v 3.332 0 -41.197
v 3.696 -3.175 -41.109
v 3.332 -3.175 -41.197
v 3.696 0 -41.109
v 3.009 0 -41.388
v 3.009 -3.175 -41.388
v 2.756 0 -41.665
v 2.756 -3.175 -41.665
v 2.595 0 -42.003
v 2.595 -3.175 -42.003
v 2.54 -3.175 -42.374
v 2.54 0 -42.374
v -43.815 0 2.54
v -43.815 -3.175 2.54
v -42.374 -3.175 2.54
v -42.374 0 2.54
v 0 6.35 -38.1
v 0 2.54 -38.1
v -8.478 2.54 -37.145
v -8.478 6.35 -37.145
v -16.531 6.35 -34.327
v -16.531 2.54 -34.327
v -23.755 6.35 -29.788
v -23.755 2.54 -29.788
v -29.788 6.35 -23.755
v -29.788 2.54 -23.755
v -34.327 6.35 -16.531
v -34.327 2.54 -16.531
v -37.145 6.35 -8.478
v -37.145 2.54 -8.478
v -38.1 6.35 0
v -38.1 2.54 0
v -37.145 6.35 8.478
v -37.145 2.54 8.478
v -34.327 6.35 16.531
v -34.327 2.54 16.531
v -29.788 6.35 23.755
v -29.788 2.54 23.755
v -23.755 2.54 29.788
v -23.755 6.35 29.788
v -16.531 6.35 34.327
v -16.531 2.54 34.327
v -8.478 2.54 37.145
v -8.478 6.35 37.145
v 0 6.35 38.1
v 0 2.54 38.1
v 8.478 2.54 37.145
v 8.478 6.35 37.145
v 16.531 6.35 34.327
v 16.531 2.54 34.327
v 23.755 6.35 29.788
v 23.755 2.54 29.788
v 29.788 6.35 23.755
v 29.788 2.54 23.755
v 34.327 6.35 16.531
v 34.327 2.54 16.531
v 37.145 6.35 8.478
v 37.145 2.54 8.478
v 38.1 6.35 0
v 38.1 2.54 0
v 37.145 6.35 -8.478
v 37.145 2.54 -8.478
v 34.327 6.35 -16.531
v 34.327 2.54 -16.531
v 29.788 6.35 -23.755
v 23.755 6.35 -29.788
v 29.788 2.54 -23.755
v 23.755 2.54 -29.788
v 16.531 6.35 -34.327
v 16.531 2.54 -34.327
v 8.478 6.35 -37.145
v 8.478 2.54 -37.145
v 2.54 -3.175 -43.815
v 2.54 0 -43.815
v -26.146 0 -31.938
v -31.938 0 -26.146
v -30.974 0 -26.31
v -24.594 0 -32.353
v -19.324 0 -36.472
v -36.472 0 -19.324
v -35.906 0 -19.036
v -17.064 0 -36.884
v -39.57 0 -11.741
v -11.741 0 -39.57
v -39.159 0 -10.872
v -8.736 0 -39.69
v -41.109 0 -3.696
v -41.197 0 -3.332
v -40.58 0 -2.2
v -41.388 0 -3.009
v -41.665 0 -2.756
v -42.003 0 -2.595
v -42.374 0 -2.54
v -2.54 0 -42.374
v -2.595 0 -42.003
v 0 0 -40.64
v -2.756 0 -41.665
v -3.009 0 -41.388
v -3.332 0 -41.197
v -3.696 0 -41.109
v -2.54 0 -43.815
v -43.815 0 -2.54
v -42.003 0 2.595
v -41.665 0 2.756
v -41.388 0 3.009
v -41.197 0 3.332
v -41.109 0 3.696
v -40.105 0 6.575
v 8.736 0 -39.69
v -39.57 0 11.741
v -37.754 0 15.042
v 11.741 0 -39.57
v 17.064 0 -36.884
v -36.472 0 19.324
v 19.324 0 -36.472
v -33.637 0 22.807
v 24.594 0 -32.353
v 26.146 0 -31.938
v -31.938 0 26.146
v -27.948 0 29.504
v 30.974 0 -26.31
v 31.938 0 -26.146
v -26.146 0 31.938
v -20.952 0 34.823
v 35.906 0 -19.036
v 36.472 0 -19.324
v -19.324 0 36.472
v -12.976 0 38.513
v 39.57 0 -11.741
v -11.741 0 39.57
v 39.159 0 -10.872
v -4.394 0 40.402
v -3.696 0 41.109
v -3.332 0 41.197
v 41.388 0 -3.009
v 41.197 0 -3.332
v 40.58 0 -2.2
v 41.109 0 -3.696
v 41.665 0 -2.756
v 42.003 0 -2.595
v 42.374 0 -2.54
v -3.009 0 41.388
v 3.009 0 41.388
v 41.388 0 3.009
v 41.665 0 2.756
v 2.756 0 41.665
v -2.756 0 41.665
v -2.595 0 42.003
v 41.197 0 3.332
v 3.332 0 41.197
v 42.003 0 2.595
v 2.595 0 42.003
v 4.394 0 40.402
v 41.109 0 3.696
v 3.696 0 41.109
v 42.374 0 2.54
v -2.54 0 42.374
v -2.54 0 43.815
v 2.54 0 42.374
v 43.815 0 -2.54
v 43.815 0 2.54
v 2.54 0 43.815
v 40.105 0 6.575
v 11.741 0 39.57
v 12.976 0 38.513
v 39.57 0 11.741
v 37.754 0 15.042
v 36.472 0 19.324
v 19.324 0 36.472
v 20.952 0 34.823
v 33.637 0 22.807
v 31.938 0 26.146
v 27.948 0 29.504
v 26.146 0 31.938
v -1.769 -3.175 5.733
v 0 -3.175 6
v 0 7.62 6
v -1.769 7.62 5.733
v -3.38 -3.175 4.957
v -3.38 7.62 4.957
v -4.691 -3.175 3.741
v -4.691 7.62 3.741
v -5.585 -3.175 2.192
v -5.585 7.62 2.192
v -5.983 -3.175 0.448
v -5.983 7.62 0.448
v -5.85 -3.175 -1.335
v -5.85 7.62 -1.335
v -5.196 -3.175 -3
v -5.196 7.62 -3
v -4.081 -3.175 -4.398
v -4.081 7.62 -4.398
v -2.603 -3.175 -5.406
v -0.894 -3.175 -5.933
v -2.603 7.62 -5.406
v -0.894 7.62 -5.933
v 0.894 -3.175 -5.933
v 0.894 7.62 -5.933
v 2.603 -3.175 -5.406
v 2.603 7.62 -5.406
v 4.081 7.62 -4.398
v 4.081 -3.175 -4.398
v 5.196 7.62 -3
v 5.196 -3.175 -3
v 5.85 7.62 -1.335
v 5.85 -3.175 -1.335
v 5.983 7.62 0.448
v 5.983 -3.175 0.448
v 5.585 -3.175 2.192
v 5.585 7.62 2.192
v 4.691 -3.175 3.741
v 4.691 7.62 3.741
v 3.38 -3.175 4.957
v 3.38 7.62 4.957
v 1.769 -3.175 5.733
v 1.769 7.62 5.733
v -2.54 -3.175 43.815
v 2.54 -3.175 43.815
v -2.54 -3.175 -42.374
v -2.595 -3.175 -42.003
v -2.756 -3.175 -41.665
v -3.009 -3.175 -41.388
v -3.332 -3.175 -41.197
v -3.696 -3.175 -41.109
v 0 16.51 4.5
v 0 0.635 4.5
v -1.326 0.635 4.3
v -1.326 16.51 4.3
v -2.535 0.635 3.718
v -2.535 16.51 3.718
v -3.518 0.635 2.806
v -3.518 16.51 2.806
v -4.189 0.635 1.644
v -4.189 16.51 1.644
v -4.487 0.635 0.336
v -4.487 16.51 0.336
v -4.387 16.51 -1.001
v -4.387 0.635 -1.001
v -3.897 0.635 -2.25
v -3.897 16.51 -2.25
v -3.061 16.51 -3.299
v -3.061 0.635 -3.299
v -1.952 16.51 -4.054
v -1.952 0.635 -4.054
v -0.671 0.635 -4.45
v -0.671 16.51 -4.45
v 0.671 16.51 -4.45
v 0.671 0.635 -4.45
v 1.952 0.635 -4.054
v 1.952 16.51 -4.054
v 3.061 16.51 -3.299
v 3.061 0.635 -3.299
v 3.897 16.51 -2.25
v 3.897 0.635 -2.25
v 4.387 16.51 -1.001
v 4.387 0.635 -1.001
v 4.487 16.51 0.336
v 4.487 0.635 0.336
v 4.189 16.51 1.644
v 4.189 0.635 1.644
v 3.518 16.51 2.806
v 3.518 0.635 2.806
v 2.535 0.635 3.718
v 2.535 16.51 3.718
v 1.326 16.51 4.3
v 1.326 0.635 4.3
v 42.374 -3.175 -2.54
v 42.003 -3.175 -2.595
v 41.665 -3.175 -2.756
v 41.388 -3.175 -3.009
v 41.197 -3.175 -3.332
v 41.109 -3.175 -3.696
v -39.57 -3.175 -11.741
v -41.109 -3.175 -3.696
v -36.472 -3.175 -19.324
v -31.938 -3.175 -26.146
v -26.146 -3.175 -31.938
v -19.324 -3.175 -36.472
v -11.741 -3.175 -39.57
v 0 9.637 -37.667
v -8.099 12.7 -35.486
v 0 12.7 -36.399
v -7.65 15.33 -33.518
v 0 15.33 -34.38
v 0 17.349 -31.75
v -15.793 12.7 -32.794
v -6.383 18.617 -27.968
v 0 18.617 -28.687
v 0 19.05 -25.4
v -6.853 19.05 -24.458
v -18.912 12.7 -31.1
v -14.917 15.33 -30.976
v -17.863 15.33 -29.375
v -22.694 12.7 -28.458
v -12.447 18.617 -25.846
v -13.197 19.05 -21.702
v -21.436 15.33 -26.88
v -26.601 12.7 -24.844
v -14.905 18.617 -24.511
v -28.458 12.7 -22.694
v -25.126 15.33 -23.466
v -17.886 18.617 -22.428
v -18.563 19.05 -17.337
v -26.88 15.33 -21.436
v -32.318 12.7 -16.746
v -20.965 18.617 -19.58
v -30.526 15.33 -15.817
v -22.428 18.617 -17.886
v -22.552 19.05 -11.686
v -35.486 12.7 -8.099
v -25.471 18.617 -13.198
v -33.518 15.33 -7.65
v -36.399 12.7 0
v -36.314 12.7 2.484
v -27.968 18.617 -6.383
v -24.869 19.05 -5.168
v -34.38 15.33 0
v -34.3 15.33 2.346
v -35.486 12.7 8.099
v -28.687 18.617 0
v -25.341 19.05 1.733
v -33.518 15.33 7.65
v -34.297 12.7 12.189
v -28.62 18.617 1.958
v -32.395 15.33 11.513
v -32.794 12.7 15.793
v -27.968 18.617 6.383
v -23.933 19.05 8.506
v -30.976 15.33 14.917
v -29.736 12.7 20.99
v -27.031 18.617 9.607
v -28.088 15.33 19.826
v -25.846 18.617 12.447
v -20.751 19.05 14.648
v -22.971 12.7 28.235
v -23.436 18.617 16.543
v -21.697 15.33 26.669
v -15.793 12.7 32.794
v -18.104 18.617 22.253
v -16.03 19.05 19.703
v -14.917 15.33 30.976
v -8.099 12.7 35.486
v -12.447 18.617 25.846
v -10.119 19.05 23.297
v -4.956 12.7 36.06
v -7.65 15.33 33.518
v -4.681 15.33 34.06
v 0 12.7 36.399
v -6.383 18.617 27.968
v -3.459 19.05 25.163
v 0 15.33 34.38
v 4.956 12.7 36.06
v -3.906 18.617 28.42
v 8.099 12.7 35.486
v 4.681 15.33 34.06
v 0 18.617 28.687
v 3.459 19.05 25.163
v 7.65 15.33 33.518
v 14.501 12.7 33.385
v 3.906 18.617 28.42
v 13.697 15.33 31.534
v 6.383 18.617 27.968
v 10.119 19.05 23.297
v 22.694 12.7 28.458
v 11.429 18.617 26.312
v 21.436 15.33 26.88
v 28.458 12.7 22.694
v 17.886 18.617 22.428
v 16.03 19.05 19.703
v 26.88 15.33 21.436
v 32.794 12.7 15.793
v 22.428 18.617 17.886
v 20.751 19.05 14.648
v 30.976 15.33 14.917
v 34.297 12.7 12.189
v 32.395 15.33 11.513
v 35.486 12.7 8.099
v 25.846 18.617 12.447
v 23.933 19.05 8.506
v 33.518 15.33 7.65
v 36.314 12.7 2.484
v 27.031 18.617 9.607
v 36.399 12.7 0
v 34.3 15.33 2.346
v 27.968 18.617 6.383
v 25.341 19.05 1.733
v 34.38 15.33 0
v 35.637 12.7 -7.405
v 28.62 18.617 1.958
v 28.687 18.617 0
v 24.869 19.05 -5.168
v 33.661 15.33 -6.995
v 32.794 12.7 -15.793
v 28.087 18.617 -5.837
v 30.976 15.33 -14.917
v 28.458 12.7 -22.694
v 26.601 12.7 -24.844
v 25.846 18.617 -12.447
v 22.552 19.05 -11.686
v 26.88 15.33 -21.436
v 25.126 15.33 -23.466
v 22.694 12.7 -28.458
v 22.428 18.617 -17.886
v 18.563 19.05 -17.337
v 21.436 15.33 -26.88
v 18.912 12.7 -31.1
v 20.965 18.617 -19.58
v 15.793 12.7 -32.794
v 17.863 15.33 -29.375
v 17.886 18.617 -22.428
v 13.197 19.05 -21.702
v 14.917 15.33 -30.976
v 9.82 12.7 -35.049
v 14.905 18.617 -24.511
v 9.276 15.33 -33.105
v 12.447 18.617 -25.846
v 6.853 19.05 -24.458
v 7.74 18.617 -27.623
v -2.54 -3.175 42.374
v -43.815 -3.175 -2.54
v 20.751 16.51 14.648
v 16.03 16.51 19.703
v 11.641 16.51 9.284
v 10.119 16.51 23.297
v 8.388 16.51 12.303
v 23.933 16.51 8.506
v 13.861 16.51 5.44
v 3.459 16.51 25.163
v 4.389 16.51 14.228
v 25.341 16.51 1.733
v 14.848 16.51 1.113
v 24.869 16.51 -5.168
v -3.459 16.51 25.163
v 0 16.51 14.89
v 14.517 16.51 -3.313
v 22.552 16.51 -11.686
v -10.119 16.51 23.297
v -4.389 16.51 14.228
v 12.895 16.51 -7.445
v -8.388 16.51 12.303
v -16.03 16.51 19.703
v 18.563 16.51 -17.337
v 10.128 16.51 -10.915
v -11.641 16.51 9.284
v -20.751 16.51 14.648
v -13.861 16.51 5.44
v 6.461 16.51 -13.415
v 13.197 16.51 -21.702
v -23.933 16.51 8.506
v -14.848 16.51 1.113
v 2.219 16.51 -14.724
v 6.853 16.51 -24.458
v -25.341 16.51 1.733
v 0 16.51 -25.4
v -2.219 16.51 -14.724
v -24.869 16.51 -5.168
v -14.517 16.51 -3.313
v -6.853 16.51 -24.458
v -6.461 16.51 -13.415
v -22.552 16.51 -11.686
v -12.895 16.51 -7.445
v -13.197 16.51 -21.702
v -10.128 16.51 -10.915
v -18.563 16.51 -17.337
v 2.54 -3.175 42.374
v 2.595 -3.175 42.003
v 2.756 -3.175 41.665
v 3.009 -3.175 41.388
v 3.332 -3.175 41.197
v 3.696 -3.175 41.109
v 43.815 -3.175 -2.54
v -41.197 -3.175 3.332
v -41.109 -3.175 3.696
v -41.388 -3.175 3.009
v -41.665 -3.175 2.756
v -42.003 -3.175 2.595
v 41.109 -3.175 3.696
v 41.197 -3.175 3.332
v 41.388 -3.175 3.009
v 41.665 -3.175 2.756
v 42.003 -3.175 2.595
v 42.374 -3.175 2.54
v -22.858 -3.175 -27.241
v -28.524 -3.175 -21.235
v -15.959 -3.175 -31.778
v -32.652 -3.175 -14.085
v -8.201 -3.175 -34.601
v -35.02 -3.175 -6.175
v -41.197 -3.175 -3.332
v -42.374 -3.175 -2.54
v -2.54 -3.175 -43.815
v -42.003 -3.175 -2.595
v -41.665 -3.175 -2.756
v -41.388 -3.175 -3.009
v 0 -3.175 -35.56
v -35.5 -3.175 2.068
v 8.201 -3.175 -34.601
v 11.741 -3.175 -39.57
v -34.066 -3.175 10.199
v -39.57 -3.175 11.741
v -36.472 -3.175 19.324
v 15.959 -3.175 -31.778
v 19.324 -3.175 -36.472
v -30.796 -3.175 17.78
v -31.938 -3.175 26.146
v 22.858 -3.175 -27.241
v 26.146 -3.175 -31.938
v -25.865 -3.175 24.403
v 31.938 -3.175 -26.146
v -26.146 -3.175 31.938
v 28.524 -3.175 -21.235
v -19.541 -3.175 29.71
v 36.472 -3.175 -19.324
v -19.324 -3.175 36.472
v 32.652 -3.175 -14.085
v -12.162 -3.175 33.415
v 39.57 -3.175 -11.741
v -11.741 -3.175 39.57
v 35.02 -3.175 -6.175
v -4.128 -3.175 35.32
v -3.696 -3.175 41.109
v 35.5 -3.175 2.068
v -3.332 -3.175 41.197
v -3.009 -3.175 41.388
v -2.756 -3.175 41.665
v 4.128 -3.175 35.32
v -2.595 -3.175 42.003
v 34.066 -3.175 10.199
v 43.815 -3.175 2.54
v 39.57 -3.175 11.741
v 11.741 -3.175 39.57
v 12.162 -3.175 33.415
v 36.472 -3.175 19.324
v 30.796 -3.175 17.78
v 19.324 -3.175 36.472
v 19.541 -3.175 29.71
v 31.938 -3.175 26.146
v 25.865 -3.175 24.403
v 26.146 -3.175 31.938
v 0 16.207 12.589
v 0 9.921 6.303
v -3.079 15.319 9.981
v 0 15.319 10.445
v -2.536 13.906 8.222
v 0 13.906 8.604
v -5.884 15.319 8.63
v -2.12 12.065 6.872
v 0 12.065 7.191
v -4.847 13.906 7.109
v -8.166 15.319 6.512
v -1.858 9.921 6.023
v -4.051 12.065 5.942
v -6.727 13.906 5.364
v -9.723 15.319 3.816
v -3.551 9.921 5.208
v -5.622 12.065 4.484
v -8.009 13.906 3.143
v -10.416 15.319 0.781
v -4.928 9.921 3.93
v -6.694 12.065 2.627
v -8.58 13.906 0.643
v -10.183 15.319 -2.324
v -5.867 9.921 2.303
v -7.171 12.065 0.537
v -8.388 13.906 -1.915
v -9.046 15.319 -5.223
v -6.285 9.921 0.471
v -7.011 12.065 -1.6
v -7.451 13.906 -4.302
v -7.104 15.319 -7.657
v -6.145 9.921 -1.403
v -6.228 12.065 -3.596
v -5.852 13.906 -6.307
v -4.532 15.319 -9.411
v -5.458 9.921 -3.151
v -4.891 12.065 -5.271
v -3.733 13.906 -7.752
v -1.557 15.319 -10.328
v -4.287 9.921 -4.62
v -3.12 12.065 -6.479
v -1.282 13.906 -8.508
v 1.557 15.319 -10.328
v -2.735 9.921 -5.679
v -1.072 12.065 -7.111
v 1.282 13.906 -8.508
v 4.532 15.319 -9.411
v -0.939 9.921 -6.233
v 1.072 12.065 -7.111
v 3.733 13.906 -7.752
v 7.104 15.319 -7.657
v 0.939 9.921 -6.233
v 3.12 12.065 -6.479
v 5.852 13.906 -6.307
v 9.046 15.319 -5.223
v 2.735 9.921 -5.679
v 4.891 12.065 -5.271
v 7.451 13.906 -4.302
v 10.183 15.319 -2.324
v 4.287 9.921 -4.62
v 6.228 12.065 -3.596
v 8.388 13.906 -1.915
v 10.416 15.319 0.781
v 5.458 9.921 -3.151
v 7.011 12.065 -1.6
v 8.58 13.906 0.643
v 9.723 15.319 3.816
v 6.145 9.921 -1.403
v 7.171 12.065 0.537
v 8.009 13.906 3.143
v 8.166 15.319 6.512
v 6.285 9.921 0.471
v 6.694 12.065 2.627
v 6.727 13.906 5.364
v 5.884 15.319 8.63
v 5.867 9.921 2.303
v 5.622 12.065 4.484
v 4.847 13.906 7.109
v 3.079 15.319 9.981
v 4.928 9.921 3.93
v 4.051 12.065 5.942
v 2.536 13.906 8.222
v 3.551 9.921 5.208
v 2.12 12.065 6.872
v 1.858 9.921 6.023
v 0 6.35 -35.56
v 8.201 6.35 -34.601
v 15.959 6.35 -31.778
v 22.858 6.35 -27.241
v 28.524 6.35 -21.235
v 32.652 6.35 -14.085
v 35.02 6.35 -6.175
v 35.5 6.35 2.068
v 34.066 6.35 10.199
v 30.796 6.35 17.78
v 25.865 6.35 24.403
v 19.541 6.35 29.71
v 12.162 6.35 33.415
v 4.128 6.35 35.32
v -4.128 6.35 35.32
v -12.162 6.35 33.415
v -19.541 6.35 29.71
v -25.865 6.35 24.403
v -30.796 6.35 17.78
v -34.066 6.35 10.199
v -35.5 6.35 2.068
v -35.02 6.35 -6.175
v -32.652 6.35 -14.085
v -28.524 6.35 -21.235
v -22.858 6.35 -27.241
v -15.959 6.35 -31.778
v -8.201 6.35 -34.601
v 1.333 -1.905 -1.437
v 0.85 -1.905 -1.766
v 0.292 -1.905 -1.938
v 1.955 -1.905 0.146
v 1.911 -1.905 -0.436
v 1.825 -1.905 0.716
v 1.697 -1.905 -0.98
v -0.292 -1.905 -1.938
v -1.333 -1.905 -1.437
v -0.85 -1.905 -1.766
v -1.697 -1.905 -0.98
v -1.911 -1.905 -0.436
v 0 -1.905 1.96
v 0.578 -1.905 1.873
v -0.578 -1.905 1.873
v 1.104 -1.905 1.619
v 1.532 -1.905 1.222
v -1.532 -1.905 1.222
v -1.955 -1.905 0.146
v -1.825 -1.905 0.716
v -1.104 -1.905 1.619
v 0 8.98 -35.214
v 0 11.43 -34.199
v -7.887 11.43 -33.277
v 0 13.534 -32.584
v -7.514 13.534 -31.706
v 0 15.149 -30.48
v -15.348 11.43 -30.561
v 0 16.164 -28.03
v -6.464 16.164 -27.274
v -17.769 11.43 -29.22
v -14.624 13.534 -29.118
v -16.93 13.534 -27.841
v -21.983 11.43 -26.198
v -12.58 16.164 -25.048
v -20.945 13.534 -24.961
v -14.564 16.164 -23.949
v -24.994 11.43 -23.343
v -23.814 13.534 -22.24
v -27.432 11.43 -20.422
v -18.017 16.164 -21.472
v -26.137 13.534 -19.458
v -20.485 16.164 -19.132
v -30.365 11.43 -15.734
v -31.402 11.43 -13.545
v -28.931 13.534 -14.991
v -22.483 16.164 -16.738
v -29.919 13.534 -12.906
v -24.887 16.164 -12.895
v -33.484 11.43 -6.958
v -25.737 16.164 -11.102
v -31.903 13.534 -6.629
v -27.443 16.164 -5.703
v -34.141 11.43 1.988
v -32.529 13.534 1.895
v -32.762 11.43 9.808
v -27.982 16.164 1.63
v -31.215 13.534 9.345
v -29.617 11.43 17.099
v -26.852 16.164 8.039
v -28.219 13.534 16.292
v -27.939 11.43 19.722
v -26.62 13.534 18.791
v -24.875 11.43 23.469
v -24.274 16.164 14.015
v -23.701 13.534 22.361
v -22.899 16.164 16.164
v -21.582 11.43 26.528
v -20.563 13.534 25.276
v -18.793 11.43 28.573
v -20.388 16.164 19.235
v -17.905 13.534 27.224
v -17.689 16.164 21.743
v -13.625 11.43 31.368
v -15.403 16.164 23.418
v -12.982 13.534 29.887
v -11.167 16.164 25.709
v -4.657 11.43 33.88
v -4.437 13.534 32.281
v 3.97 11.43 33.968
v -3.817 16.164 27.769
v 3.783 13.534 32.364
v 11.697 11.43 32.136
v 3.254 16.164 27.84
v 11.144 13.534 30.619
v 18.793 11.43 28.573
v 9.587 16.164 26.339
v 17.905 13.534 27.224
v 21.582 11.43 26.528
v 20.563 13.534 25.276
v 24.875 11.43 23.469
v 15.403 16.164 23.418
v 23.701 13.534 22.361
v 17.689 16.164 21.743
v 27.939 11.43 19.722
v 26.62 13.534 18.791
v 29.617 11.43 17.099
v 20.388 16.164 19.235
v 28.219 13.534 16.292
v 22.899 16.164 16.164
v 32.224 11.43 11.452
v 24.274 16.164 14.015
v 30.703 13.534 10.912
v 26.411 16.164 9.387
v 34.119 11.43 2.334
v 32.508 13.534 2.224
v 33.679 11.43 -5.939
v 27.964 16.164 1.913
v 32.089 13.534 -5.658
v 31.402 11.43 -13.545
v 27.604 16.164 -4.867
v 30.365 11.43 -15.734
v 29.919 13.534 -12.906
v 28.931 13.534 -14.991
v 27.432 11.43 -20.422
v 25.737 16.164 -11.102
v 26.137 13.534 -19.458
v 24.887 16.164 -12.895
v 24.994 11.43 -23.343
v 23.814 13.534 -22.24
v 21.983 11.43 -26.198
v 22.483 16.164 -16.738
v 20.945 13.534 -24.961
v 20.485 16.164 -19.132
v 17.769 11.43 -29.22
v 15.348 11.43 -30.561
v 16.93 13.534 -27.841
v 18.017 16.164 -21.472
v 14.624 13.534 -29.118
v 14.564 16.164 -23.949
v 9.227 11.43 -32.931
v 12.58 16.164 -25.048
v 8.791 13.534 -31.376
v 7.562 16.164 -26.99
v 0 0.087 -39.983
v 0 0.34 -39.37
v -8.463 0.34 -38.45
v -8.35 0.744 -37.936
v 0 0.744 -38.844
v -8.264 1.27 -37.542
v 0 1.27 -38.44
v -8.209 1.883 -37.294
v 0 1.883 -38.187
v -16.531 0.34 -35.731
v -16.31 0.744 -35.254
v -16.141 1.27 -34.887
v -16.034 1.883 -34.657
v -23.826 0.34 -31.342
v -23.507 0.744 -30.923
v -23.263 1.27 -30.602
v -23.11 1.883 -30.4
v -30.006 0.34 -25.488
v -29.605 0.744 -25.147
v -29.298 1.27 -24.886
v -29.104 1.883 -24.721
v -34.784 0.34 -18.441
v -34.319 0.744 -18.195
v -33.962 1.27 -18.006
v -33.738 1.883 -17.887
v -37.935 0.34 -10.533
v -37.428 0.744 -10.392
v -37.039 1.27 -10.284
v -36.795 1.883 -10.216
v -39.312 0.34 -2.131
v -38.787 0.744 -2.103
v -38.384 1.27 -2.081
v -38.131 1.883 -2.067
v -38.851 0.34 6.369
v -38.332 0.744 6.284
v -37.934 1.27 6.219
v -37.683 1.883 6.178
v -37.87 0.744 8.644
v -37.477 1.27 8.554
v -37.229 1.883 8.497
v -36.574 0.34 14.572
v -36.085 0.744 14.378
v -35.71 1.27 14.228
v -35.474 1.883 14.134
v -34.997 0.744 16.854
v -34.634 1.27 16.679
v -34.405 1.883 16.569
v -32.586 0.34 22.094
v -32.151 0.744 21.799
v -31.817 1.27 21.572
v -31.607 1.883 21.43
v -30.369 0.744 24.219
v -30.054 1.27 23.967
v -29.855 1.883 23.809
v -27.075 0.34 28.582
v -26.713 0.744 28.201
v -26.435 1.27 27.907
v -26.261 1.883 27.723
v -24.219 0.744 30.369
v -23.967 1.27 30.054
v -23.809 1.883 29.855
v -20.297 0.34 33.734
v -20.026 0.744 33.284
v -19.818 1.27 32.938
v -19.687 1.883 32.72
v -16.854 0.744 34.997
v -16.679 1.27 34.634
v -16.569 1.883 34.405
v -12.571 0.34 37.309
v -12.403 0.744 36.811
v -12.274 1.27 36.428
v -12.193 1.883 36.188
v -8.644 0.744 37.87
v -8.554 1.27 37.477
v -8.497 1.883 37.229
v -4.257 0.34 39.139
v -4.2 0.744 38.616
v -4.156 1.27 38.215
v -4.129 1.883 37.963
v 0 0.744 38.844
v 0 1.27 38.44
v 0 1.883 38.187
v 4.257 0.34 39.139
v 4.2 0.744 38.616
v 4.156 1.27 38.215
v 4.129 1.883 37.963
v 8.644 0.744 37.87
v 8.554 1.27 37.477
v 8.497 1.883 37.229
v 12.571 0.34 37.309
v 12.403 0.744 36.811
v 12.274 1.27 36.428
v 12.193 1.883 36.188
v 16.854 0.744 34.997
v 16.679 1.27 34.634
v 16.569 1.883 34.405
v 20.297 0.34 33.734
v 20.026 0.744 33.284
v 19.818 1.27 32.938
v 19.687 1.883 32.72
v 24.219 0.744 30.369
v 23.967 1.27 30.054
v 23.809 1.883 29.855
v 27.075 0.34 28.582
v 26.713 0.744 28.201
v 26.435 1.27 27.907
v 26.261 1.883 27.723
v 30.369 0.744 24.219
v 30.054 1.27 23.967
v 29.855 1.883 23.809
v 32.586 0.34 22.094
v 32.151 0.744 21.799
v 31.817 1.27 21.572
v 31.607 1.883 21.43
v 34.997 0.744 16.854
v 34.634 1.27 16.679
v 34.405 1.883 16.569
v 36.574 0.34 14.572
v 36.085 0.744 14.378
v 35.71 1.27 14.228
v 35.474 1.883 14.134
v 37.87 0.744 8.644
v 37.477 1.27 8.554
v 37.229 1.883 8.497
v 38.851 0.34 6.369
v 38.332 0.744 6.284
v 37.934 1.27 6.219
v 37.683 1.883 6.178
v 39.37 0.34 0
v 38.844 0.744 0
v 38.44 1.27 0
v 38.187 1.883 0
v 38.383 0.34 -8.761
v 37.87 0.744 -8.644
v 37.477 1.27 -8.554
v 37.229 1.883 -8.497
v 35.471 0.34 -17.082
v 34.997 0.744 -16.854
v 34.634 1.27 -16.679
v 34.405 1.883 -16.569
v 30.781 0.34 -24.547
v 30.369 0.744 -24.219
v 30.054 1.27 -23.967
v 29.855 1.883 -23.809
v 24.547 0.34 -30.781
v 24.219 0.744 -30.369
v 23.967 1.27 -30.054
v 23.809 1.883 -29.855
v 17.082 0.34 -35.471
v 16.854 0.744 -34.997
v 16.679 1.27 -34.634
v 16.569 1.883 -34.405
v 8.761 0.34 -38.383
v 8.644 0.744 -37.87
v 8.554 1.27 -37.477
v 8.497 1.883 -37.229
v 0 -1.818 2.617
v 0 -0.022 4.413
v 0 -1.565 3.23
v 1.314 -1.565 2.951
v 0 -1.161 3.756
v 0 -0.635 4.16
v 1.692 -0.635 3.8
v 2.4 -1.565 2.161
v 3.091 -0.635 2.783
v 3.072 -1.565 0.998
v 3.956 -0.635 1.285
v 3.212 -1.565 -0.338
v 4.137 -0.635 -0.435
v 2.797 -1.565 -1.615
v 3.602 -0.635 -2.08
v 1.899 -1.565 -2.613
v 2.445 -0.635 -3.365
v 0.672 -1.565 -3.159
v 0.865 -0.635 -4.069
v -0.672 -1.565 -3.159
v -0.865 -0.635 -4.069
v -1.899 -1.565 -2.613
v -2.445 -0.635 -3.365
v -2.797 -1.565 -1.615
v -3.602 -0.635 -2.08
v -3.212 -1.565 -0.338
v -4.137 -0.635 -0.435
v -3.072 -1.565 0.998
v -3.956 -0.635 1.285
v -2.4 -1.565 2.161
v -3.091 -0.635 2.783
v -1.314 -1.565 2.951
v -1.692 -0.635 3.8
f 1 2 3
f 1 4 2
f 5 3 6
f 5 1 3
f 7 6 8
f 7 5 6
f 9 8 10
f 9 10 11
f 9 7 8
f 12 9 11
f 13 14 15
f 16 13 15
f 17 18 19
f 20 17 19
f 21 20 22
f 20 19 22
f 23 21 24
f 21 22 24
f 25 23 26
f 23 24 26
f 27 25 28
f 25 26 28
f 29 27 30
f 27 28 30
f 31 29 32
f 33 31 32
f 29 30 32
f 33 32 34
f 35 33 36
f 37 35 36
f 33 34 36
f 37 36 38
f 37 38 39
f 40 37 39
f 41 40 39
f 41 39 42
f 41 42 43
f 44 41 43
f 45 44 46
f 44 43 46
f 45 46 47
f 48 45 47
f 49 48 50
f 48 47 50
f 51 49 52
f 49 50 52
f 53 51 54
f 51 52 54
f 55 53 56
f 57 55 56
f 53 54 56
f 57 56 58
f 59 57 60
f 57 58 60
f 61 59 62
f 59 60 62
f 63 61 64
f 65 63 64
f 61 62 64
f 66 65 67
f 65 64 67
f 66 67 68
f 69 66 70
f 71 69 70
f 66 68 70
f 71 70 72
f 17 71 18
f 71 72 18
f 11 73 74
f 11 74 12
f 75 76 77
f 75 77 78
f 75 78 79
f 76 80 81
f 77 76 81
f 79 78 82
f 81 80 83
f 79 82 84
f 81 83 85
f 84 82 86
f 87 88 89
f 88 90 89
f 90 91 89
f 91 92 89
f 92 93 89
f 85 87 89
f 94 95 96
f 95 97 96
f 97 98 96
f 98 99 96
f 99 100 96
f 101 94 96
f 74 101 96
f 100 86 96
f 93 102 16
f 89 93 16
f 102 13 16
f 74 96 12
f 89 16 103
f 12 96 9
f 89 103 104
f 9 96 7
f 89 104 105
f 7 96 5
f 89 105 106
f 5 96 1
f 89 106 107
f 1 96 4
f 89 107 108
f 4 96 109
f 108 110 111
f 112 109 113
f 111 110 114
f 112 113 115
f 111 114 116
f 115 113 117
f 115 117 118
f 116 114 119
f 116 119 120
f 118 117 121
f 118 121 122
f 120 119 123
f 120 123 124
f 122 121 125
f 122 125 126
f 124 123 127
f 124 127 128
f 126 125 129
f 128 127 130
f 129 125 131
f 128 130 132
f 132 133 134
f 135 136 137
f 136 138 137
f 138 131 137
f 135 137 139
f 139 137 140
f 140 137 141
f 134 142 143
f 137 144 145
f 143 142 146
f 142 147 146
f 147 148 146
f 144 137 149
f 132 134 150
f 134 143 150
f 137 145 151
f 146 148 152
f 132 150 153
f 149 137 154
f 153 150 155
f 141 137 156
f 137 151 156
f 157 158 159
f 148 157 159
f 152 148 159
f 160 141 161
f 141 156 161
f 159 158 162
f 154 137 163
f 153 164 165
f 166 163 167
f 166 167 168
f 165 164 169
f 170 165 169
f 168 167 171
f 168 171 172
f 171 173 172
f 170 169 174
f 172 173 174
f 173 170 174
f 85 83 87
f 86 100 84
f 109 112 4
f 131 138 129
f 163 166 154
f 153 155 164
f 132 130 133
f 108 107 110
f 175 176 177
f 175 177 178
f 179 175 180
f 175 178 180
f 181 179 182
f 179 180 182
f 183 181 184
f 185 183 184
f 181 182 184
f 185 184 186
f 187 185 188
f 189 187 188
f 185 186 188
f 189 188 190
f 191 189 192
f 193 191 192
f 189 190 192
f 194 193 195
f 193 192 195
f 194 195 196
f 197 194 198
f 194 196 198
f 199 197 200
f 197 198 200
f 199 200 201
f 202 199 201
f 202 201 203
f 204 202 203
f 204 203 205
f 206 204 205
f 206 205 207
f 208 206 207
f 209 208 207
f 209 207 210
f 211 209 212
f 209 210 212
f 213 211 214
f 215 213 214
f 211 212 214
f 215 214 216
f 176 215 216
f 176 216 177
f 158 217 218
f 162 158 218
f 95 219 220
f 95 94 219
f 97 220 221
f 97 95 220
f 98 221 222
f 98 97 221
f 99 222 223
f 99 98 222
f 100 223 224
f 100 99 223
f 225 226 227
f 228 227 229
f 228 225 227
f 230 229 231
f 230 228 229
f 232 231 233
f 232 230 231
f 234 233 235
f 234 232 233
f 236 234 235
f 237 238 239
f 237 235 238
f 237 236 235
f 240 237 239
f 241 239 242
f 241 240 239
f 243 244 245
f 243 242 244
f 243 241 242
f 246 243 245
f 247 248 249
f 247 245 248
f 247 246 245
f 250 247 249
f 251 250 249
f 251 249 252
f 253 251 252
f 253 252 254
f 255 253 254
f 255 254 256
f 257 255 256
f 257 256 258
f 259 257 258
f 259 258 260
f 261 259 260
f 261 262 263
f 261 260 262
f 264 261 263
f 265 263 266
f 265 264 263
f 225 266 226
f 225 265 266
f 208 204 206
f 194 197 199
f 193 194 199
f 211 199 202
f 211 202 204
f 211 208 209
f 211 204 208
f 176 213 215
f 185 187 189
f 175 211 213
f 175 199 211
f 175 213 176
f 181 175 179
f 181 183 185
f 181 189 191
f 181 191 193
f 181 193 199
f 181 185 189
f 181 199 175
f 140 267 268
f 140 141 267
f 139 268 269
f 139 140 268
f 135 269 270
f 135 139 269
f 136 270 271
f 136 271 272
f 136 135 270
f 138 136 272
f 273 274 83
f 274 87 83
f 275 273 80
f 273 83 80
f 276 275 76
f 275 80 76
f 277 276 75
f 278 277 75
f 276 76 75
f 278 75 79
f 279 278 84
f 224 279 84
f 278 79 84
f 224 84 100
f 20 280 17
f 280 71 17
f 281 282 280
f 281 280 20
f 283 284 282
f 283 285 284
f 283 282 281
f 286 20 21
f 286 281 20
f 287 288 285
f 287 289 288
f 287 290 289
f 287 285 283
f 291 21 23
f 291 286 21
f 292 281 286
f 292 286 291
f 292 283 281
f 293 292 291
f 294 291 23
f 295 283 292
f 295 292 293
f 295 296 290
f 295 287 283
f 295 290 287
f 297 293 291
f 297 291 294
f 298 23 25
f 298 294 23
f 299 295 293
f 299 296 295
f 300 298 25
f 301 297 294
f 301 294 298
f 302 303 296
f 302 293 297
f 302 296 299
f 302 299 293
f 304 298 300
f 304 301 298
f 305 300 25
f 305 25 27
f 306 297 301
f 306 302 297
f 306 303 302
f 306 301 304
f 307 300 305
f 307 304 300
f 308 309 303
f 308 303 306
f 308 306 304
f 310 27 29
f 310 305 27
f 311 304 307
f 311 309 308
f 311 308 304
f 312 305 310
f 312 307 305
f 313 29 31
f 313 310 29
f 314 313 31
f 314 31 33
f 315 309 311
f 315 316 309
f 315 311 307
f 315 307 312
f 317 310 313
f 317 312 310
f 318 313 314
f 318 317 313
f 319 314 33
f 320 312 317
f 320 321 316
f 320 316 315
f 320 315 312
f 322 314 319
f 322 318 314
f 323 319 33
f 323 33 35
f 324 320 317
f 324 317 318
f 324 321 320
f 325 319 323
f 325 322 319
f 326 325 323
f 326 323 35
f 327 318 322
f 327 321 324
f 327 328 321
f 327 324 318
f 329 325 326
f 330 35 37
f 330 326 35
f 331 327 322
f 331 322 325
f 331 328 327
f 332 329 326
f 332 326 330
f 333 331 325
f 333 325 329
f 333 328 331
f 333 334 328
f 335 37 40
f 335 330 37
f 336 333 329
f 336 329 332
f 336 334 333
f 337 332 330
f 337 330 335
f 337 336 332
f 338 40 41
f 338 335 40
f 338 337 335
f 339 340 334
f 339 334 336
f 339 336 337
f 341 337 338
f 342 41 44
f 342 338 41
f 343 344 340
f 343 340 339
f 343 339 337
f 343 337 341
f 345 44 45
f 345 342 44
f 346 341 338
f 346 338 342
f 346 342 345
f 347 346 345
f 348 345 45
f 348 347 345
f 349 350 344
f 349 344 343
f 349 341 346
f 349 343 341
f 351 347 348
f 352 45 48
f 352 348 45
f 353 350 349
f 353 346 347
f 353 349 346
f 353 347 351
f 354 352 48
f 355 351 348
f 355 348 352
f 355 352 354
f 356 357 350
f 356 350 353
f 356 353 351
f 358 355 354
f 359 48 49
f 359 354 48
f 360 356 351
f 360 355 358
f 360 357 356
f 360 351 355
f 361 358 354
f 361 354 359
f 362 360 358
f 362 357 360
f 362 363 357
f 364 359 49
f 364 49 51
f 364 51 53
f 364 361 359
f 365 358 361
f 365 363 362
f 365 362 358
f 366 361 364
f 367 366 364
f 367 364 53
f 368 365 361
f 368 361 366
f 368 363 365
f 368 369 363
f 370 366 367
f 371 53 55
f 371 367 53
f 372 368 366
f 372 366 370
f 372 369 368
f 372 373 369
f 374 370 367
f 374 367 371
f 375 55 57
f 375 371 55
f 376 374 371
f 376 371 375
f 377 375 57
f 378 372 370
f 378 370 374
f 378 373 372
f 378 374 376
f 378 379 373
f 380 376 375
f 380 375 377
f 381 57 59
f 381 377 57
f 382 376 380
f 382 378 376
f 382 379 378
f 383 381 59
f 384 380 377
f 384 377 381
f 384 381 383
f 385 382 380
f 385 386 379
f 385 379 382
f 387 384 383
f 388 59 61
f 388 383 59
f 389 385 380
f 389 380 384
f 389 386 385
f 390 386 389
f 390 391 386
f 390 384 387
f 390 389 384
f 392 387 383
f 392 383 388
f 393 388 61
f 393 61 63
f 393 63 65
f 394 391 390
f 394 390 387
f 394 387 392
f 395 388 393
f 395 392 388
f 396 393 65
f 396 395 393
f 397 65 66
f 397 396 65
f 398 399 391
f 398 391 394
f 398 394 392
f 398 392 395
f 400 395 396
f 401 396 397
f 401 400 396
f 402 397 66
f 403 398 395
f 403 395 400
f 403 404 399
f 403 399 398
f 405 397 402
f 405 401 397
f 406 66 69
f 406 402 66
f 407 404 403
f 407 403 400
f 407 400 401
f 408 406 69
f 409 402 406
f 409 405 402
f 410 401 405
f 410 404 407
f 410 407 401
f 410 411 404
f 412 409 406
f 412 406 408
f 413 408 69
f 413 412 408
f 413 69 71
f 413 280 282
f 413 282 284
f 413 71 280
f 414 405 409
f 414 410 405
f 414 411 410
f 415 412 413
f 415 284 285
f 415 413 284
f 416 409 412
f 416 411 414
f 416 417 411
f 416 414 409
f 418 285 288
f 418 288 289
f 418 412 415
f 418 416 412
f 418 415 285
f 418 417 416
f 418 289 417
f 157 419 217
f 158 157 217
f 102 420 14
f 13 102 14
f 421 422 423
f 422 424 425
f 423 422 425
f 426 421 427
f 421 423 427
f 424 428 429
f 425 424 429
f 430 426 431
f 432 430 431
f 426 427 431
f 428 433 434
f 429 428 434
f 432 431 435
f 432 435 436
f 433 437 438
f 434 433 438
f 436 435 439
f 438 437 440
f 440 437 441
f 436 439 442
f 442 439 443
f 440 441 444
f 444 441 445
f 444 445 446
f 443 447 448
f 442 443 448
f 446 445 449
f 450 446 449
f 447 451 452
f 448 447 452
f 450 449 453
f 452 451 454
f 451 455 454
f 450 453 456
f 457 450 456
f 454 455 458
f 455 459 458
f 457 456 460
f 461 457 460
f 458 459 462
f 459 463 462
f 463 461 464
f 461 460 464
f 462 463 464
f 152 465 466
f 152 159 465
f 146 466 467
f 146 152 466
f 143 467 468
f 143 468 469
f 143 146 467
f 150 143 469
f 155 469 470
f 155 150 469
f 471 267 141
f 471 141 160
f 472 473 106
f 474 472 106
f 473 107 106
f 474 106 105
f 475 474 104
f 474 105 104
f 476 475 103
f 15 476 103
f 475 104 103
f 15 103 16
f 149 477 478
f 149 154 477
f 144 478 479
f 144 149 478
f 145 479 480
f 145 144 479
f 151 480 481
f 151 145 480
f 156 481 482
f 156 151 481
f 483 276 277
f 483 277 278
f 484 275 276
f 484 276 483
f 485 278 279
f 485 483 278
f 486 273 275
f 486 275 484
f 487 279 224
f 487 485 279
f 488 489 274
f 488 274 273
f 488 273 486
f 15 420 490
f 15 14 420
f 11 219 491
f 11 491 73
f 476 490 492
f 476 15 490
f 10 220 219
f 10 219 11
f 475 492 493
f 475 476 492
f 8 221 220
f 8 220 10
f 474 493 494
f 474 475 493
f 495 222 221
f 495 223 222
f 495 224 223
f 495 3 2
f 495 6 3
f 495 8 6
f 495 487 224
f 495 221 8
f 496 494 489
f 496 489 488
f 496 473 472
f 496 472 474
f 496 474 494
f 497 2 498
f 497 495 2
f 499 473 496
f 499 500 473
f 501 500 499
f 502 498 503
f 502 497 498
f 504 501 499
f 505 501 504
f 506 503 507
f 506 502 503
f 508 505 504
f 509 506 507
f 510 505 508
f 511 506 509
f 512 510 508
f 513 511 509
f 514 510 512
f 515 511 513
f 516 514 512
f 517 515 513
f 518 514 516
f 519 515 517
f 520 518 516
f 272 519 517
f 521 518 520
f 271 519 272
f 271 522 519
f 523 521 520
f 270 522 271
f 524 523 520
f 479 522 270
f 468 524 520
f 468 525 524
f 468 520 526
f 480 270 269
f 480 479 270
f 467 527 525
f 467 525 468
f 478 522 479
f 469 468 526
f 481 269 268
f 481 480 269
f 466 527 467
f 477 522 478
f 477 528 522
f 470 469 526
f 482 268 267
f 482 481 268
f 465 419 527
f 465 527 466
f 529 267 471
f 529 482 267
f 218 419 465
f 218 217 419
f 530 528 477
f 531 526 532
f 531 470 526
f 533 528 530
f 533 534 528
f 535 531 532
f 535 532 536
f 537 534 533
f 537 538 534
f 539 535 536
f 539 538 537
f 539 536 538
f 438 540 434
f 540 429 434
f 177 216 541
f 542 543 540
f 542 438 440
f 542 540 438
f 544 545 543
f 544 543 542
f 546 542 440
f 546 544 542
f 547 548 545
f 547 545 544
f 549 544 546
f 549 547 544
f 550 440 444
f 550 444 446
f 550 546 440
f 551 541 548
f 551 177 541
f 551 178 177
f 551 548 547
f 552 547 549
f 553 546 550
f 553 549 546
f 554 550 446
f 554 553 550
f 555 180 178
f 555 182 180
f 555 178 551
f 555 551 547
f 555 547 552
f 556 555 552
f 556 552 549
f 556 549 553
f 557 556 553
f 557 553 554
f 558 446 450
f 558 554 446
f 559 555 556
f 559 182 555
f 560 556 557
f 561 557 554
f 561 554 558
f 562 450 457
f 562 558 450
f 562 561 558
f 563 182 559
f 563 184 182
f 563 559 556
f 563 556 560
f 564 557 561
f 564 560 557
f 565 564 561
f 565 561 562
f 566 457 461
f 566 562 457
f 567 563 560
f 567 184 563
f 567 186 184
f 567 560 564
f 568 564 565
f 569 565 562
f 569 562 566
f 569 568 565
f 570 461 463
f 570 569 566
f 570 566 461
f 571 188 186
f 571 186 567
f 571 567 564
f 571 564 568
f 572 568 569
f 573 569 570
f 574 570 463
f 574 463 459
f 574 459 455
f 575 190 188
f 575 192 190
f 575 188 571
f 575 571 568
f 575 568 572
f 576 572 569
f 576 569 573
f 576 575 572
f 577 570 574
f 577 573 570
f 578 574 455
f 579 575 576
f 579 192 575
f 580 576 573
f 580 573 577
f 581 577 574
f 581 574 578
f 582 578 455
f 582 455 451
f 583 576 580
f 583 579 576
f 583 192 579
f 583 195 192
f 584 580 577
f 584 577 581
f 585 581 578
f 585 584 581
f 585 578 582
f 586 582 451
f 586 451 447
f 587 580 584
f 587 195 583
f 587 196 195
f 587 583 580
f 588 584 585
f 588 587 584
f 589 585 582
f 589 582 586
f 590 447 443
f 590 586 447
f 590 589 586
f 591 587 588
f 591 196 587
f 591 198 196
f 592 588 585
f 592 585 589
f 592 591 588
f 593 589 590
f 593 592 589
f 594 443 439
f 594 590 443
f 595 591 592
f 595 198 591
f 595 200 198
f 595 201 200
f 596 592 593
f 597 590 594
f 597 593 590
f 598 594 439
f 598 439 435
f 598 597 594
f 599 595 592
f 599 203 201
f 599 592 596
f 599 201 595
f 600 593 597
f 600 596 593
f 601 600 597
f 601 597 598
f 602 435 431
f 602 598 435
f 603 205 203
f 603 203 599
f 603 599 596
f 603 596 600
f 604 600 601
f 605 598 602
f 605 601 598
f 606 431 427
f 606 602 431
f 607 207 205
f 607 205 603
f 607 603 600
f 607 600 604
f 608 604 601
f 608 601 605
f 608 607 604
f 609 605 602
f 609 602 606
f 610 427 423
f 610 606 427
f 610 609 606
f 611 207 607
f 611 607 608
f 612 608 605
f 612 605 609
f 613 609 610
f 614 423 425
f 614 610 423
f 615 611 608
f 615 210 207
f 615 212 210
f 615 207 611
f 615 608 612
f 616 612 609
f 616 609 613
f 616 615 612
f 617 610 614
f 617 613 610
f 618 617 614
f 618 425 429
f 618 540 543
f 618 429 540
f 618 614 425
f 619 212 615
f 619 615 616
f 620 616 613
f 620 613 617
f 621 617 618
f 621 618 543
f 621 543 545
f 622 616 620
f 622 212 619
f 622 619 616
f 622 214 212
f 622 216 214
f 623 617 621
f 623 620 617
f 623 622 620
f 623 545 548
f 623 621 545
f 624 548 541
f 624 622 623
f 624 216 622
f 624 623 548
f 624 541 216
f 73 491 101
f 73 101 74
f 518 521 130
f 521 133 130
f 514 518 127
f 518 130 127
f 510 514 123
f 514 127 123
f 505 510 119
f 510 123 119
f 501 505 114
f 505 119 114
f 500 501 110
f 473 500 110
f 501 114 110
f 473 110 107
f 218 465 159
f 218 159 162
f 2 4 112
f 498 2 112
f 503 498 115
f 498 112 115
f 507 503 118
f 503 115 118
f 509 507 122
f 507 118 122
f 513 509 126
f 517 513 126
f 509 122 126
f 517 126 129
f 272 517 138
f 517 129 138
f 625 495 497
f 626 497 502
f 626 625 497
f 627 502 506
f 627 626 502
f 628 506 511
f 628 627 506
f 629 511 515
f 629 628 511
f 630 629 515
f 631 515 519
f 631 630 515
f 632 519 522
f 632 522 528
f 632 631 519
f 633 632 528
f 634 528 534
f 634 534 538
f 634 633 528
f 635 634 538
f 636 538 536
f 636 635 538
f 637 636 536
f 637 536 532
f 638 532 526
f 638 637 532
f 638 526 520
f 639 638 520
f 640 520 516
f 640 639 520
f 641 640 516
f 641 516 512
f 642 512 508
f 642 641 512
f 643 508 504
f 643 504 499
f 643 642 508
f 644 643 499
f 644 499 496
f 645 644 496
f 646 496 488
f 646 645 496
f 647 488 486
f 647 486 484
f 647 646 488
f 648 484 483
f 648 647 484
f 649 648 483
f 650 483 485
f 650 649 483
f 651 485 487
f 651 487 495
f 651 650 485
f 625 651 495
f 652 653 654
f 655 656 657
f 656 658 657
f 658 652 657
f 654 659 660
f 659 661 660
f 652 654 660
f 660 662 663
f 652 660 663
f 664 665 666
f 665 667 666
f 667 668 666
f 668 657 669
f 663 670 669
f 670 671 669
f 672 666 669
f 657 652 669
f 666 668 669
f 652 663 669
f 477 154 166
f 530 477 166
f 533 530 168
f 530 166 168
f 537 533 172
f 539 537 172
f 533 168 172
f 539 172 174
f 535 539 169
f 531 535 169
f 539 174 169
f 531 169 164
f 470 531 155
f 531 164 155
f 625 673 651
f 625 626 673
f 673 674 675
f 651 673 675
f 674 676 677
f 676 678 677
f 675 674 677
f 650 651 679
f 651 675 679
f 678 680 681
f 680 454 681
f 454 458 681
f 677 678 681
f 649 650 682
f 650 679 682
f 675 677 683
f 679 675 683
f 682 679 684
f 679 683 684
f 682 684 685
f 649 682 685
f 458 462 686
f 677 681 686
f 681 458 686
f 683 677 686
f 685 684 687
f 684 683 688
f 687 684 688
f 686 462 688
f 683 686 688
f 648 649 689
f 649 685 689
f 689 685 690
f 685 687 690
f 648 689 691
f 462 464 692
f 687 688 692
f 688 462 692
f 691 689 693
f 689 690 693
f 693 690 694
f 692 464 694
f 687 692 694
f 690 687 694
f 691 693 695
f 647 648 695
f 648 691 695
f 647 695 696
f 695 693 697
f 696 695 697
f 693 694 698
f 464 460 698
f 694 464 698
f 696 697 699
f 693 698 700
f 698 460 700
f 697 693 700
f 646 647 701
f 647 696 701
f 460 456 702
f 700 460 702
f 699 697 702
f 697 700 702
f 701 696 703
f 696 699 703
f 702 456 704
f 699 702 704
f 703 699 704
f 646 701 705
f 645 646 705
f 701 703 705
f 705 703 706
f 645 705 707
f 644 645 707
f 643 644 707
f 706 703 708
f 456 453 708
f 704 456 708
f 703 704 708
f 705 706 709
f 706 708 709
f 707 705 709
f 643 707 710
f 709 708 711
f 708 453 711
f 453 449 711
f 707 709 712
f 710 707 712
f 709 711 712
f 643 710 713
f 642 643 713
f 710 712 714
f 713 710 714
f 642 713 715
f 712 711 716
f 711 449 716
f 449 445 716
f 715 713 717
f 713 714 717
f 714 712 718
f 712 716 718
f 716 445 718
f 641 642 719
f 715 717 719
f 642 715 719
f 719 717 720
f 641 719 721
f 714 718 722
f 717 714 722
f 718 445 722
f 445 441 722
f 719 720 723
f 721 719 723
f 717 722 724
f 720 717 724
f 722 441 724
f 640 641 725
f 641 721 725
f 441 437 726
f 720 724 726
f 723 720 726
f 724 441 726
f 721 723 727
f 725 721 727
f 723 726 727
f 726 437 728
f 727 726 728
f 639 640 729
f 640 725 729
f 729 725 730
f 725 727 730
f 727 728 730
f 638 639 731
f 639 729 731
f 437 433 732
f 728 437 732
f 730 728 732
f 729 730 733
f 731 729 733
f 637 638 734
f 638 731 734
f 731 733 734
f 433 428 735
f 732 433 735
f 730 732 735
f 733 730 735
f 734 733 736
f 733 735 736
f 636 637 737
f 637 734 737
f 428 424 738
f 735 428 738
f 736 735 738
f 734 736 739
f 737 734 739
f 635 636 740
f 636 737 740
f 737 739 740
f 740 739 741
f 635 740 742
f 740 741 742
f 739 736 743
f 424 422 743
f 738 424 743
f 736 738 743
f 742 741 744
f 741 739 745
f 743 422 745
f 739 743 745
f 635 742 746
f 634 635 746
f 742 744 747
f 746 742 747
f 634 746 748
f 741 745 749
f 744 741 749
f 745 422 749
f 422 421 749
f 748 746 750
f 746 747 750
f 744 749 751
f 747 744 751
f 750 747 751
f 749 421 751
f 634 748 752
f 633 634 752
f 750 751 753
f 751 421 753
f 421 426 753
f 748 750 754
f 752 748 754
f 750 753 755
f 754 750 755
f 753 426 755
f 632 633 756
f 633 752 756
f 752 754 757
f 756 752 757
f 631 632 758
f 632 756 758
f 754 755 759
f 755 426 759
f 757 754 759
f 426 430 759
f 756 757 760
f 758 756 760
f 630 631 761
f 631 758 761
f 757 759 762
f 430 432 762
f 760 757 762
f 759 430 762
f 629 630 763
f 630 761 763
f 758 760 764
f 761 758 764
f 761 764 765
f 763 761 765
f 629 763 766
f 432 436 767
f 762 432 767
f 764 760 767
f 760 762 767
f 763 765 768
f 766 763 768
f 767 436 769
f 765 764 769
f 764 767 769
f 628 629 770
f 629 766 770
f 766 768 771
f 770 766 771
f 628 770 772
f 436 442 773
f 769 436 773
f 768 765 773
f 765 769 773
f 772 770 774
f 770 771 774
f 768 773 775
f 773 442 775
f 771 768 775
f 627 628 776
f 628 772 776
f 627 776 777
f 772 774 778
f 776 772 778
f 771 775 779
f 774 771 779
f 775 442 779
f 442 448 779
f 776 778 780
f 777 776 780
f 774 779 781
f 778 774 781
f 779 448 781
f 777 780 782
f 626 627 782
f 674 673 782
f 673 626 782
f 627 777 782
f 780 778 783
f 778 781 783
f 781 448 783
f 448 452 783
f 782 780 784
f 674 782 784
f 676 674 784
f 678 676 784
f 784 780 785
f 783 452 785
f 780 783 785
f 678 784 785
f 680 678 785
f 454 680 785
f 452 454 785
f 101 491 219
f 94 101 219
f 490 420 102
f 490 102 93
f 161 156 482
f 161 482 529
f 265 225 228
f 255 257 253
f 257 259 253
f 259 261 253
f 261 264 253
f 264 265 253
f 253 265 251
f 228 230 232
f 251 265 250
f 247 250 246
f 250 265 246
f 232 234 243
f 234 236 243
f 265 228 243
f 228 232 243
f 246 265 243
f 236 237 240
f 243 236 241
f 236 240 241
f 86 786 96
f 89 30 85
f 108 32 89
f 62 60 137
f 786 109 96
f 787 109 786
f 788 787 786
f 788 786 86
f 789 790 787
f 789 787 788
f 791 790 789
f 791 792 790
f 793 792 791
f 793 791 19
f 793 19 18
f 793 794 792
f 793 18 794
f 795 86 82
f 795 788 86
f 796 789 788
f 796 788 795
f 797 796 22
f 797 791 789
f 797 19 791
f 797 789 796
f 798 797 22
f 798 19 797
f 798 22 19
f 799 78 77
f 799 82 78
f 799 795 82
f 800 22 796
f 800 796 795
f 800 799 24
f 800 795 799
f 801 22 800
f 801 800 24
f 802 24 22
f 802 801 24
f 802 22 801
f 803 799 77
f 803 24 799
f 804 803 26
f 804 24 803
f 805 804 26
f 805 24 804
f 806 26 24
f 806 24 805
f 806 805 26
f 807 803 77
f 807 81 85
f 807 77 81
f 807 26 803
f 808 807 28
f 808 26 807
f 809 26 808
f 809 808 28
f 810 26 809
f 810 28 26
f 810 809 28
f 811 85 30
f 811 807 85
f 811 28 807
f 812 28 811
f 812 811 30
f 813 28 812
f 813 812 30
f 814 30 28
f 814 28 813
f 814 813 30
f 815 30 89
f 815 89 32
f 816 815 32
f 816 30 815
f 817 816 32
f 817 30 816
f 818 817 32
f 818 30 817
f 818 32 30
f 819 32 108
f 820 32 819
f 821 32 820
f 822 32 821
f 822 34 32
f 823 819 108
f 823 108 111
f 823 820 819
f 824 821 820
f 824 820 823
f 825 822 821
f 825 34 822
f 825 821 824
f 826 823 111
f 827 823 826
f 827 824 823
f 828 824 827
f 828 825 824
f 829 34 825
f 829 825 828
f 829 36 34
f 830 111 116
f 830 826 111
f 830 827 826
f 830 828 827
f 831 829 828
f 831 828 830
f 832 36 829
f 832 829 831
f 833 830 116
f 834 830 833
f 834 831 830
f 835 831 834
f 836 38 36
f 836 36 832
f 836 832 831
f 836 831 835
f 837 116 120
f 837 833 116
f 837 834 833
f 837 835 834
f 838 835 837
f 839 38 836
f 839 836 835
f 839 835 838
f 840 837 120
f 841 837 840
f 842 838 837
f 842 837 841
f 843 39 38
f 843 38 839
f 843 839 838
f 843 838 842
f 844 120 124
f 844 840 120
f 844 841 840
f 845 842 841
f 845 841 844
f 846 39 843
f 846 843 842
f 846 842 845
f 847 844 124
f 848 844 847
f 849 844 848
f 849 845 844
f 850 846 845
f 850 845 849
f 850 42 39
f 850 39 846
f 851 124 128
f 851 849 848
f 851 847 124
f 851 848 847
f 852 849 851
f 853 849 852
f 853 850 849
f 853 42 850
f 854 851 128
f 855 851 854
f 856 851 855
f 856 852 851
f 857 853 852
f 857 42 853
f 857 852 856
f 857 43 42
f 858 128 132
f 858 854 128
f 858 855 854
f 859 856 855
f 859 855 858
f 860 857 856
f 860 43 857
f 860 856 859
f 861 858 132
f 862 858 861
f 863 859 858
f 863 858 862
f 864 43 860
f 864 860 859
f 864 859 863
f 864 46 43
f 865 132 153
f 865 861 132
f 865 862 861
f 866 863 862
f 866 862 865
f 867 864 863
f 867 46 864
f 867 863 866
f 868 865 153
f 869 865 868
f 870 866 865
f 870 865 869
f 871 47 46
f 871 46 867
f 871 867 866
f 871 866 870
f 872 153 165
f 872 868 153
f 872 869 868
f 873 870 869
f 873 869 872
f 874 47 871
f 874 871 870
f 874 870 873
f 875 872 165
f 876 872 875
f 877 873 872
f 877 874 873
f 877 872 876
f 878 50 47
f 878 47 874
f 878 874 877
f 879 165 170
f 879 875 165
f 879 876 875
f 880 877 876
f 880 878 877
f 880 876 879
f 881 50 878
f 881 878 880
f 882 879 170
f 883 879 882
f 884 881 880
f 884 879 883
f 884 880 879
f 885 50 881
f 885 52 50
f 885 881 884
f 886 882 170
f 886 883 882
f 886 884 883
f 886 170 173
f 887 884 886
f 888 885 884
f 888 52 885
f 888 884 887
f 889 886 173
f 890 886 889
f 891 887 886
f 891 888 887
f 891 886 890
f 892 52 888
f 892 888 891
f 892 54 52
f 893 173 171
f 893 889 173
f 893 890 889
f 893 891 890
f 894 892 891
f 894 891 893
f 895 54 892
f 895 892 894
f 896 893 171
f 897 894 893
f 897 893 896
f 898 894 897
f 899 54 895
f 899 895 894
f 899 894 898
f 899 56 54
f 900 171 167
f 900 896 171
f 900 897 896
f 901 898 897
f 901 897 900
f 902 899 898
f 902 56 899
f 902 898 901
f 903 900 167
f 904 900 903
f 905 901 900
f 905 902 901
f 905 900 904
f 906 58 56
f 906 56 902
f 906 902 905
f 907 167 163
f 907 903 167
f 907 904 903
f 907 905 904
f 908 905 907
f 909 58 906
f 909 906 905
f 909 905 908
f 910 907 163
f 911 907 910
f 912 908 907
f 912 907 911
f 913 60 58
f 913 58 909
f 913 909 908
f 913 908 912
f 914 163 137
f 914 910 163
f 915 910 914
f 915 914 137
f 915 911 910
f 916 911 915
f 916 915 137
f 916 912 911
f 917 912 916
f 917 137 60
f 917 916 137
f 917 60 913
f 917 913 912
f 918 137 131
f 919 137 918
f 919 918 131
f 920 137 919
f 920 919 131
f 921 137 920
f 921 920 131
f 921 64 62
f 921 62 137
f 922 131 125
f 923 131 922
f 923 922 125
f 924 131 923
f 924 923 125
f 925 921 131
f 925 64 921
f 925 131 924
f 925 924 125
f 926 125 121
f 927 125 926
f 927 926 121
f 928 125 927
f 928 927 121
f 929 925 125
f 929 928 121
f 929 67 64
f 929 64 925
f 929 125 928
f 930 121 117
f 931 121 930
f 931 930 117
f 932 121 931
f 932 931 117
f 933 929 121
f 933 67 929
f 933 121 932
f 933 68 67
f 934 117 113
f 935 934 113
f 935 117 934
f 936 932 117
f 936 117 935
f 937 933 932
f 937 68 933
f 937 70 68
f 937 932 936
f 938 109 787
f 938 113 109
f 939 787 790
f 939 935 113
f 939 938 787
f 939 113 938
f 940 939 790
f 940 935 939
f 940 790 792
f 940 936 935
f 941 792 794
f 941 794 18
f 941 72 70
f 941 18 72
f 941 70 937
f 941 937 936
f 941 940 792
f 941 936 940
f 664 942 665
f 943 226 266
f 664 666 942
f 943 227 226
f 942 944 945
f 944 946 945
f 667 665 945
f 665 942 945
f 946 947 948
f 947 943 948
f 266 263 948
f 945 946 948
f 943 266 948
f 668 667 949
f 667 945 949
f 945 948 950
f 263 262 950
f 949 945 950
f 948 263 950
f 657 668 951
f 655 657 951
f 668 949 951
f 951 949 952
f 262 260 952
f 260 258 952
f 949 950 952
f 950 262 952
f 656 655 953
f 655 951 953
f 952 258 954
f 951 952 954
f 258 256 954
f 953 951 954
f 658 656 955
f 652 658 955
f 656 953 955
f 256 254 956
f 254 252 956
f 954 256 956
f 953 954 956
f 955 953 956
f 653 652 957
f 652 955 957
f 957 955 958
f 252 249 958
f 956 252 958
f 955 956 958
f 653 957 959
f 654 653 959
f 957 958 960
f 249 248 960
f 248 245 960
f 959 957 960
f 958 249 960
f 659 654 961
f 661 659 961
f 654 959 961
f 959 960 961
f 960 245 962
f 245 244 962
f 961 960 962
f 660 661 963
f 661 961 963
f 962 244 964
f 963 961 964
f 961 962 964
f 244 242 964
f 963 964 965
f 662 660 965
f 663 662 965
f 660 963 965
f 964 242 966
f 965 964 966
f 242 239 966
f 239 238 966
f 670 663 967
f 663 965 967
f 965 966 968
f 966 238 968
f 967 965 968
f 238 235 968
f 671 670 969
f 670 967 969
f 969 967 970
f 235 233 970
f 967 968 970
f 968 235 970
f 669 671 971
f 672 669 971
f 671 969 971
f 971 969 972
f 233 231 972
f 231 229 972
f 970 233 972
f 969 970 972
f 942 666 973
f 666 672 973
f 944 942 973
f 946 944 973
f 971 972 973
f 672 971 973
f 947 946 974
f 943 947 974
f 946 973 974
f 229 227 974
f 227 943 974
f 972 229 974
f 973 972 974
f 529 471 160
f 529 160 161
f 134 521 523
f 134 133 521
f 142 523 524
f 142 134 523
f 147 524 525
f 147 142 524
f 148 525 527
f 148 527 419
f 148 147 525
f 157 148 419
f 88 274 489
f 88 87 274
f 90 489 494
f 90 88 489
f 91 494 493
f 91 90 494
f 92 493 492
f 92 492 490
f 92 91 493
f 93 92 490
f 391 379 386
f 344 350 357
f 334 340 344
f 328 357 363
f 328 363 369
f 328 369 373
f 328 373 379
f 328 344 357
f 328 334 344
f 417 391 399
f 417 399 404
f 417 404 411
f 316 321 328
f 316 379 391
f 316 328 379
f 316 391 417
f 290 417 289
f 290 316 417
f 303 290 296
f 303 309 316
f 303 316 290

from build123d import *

# Parameters (mm, degrees)
SKETCH1_R            = 38.1
BOSS_EXTRUDE1_DEPTH  = 19.05
FILLET1_R            = 12.7
SKETCH2_R            = 41.275
BOSS_EXTRUDE2_DEPTH  = 3.175
SHELL2_T             = -2.54
FILLET2_R            = 2.54
SKETCH27_W           = 5.08
SKETCH27_H           = 5.08
BOSS_EXTRUDE12_DEPTH = 3.175
FILLET3_R            = 1.27
SKETCH28_R           = 38.735
SKETCH28_R_2         = 35.56
BOSS_EXTRUDE16_DEPTH = 0.635
SKETCH31_R           = 6
SKETCH31_R_2         = 4.5
BOSS_EXTRUDE17_DEPTH = 19.685
FILLET4_R            = 8.89
SKETCH32_R           = 6
BOSS_EXTRUDE18_DEPTH = 1.27
FILLET5_R            = 2.54


with BuildPart() as part:
    # Sketch1 → Boss-Extrude1 (new body)
    with BuildSketch(Plane(origin=(0, 0, 0), x_dir=(1, 0, 0), z_dir=(0, 1, 0))):
        with Locations(Location((0, 0, 0), (0, 0, 90))):
            Circle(SKETCH1_R)
    extrude(amount=BOSS_EXTRUDE1_DEPTH)

    # Fillet1
    fillet1_edges = [part.edges().sort_by_distance(p)[0] for p in [
        (0, 19.05, 38.1),
    ]]
    fillet(fillet1_edges, radius=FILLET1_R)

    # Sketch2 → Boss-Extrude2 (add)
    with BuildSketch(Plane.XZ):
        with Locations(Location((0, 0, 0), (0, 0, 270))):
            Circle(SKETCH2_R)
    extrude(amount=BOSS_EXTRUDE2_DEPTH)

    # Shell2
    shell2_openings = [part.faces().sort_by_distance(p)[0] for p in [
        (0, -3.175, 0),
    ]]
    offset(amount=SHELL2_T, openings=shell2_openings, kind=Kind.INTERSECTION)

    # Fillet2
    fillet2_edges = [part.edges().sort_by_distance(p)[0] for p in [
        (0, 0, 38.1),
    ]]
    fillet(fillet2_edges, radius=FILLET2_R)

    # Sketch27 → Boss-Extrude12 (add)
    with BuildSketch(Plane.XZ.offset(3.175)):
        with Locations((-41.275, 0)):
            Rectangle(SKETCH27_W, SKETCH27_H)
        with Locations((0, 41.275)):
            Rectangle(SKETCH27_W, SKETCH27_H)
        with Locations((41.275, 0)):
            Rectangle(SKETCH27_W, SKETCH27_H)
        with Locations((0, -41.275)):
            Rectangle(SKETCH27_W, SKETCH27_H)
    extrude(amount=-BOSS_EXTRUDE12_DEPTH)

    # Fillet3
    fillet3_edges = [part.edges().sort_by_distance(p)[0] for p in [
        (-2.54, -1.5875, 41.196772022),
        (2.54, -1.5875, 41.196772022),
        (41.196772022, -1.5875, 2.54),
        (41.196772022, -1.5875, -2.54),
        (2.54, -1.5875, -41.196772022),
        (-2.54, -1.5875, -41.196772022),
        (-41.196772022, -1.5875, -2.54),
        (-41.196772022, -1.5875, 2.54),
    ]]
    fillet(fillet3_edges, radius=FILLET3_R)

    # Sketch28 → Boss-Extrude16 (add)
    with BuildSketch(Plane.XZ.offset(2.54)):
        Circle(SKETCH28_R)
        with Locations(Location((0, 0, 0), (0, 0, 270))):
            Circle(SKETCH28_R_2, mode=Mode.SUBTRACT)
    extrude(amount=BOSS_EXTRUDE16_DEPTH)

    # Sketch31 → Boss-Extrude17 (add)
    with BuildSketch(Plane.XZ.offset(-16.51)):
        with Locations(Location((0, 0, 0), (0, 0, 90))):
            Circle(SKETCH31_R)
        with Locations(Location((0, 0, 0), (0, 0, 90))):
            Circle(SKETCH31_R_2, mode=Mode.SUBTRACT)
    extrude(amount=BOSS_EXTRUDE17_DEPTH)

    # Fillet4
    fillet4_edges = [part.edges().sort_by_distance(p)[0] for p in [
        (0, 16.51, -6),
    ]]
    fillet(fillet4_edges, radius=FILLET4_R)

    # Sketch32 → Boss-Extrude18 (add)
    with BuildSketch(Plane.XZ.offset(3.175)):
        with Locations(Location((0, 0, 0), (0, 0, 90))):
            Circle(SKETCH32_R)
    extrude(amount=-BOSS_EXTRUDE18_DEPTH)

    # Fillet5
    fillet5_edges = [part.edges().sort_by_distance(p)[0] for p in [
        (0, -1.905, -4.5),
    ]]
    fillet(fillet5_edges, radius=FILLET5_R)


solid = part.part
